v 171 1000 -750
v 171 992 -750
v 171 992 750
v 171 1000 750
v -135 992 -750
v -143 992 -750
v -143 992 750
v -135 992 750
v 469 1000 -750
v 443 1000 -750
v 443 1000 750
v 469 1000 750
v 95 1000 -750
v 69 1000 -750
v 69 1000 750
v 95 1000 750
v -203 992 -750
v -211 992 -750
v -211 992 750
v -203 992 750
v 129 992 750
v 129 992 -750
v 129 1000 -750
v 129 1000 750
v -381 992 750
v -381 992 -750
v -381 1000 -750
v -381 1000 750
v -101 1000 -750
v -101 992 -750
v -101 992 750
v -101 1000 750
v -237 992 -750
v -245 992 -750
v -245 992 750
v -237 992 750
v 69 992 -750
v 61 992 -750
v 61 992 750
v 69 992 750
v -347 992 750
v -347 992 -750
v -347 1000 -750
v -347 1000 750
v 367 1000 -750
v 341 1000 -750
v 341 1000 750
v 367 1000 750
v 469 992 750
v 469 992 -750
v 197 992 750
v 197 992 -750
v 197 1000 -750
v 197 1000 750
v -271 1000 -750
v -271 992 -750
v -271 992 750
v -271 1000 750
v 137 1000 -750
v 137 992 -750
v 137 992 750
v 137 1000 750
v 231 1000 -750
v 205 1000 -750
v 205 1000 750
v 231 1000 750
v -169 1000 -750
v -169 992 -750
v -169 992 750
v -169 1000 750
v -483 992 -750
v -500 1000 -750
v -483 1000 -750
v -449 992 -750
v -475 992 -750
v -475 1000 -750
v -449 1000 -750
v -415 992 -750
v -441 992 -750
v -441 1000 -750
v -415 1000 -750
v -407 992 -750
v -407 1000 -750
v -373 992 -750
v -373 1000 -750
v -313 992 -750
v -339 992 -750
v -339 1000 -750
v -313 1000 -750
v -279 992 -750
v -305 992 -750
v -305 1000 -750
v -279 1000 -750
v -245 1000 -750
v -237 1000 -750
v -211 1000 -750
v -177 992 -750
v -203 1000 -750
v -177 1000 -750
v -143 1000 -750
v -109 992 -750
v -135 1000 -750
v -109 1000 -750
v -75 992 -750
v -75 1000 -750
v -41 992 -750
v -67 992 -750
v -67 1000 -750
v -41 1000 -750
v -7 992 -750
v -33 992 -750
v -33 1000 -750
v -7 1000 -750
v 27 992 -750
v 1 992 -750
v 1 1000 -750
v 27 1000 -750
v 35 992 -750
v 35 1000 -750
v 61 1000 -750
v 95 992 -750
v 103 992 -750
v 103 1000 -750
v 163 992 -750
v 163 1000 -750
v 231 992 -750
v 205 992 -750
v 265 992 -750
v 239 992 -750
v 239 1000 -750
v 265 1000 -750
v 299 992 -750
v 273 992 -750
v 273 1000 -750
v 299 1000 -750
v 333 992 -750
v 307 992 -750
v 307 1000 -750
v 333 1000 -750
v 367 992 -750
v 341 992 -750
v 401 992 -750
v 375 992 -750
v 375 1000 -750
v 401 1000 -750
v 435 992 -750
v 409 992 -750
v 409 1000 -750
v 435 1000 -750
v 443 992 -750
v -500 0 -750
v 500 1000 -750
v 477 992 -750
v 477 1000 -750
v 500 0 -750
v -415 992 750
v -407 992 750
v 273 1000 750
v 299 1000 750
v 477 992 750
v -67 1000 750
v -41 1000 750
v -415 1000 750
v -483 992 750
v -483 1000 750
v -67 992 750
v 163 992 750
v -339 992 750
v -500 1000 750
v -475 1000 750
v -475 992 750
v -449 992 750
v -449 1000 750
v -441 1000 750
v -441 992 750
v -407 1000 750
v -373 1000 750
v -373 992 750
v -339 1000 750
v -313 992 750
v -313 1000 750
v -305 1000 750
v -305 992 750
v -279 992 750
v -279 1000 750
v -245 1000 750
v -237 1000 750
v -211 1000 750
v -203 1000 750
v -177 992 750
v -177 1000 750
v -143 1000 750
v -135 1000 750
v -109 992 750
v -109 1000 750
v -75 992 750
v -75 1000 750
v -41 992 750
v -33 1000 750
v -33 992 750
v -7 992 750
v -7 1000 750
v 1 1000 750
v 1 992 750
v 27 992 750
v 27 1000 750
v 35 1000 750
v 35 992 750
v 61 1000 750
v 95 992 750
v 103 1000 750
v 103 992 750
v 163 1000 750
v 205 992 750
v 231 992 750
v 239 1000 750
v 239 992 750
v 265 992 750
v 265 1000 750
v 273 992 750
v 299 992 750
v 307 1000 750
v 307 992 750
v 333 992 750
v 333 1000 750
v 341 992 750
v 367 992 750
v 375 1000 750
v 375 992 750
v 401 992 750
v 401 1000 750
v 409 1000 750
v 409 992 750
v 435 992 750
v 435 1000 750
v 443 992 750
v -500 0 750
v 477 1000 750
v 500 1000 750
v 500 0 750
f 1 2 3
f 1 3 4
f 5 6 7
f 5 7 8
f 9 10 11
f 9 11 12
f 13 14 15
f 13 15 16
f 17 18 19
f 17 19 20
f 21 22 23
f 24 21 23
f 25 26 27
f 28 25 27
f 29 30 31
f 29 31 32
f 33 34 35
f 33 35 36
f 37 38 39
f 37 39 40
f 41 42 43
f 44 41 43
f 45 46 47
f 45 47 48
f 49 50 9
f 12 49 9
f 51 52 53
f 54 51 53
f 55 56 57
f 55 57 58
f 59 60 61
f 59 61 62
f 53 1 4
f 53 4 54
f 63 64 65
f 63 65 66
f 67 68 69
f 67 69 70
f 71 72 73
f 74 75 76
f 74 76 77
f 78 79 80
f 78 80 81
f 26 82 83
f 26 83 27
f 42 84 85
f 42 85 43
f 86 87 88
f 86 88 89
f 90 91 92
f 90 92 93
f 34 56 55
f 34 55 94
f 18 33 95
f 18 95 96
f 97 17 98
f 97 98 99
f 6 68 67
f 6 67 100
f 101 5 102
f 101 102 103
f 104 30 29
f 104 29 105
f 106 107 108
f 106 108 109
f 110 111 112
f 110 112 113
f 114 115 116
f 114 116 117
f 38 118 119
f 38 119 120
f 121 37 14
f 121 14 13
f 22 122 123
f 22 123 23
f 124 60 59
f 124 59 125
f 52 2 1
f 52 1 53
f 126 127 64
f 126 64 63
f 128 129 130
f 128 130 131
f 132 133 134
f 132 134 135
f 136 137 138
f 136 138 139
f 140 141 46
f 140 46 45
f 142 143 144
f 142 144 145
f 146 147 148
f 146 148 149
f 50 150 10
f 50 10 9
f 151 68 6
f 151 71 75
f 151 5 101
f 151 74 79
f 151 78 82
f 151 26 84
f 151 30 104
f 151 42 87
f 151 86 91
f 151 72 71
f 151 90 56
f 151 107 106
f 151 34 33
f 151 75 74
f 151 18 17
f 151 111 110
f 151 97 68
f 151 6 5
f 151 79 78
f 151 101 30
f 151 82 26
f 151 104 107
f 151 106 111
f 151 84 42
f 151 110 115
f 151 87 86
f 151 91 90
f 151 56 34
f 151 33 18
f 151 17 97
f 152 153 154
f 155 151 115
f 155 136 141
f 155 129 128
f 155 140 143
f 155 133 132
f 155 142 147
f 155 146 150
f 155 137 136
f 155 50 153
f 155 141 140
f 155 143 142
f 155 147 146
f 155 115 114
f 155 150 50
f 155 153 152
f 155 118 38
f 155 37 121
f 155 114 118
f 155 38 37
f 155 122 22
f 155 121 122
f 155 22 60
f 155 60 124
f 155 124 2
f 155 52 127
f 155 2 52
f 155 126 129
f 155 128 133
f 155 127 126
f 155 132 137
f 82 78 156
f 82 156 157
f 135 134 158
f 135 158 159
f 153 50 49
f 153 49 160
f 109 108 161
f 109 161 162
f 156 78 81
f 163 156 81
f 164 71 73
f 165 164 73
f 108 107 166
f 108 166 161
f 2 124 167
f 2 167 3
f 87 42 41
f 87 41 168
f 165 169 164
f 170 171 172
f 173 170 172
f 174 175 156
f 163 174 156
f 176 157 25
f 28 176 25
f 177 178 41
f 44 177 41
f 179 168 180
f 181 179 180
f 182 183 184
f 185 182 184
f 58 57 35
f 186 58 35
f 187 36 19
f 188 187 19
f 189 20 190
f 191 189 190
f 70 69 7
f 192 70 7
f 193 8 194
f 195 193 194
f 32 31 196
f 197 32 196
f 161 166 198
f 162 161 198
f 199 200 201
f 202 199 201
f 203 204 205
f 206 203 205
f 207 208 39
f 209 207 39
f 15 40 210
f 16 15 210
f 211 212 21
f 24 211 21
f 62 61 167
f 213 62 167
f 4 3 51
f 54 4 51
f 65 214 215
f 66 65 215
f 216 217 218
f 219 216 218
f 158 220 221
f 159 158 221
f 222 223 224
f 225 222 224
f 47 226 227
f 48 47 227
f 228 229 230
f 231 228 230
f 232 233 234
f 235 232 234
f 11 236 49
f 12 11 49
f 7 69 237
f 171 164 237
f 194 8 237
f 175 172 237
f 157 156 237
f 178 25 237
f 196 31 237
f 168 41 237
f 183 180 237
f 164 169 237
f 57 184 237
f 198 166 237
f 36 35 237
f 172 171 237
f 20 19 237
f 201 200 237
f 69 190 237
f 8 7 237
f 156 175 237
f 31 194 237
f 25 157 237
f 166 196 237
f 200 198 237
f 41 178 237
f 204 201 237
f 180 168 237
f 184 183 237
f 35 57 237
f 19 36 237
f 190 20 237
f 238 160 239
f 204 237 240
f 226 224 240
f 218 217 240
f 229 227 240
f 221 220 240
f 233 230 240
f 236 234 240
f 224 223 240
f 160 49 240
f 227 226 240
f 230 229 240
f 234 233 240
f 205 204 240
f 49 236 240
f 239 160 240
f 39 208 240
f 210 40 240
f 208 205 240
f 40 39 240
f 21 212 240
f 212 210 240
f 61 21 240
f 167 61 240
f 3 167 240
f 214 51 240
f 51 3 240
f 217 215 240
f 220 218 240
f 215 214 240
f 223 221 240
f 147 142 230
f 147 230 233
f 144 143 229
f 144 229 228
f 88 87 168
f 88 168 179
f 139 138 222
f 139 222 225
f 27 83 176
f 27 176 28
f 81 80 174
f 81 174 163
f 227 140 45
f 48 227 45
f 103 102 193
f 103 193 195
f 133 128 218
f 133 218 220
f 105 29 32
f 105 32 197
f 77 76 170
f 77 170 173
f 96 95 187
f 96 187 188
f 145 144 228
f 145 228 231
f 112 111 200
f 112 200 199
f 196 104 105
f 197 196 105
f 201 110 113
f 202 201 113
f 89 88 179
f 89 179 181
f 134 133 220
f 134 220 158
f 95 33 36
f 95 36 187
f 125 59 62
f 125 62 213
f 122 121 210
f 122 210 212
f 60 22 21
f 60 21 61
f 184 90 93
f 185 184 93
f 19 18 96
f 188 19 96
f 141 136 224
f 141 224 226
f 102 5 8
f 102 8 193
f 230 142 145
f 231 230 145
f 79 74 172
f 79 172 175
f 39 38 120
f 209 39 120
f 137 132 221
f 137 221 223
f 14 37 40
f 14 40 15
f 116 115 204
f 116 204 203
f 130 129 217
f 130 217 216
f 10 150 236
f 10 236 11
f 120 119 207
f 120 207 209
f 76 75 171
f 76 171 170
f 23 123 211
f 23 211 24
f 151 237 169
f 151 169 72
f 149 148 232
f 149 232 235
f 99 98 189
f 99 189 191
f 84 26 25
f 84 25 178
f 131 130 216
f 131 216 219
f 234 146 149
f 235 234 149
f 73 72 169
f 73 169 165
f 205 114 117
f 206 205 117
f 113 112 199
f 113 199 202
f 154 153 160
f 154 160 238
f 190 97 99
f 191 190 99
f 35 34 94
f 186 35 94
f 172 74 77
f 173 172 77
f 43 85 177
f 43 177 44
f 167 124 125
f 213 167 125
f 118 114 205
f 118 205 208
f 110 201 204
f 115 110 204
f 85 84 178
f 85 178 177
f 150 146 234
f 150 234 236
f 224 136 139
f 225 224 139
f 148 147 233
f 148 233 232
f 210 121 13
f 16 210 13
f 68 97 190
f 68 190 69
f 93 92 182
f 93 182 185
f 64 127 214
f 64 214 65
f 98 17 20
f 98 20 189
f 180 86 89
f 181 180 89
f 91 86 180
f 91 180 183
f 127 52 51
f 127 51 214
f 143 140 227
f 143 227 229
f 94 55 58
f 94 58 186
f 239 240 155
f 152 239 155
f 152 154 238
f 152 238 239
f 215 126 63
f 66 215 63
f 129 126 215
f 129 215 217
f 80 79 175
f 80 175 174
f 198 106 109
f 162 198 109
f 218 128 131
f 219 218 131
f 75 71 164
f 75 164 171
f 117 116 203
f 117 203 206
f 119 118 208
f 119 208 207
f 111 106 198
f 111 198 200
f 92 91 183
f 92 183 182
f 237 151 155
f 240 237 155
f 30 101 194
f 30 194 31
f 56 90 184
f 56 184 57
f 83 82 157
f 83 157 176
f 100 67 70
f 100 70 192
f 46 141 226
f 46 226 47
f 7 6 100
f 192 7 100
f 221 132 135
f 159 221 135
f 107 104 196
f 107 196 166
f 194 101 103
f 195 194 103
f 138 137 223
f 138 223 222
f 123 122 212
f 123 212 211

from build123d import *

# Parameters (mm, degrees)
SKETCH_2_W          = 1000
SKETCH_2_H          = 1500
EXTRUDE_1_DEPTH     = 1000
SKETCH_4_W          = 8
SKETCH_4_H          = 8
CUT_EXTRUDE_1_DEPTH = 1500


with BuildPart() as part:
    # 草图2 → 凸台-拉伸1 (new body)
    with BuildSketch(Plane(origin=(0, 0, 0), x_dir=(1, 0, 0), z_dir=(0, 1, 0))):
        Rectangle(SKETCH_2_W, SKETCH_2_H)
    extrude(amount=EXTRUDE_1_DEPTH)

    # 草图4 → 切除-拉伸1 (cut)
    with BuildSketch(Plane.XY.offset(750)):
        with Locations((-479, 996)):
            Rectangle(SKETCH_4_W, SKETCH_4_H)
        with Locations((-445, 996)):
            Rectangle(SKETCH_4_W, SKETCH_4_H)
        with Locations((-411, 996)):
            Rectangle(SKETCH_4_W, SKETCH_4_H)
        with Locations((-377, 996)):
            Rectangle(SKETCH_4_W, SKETCH_4_H)
        with Locations((-343, 996)):
            Rectangle(SKETCH_4_W, SKETCH_4_H)
        with Locations((-309, 996)):
            Rectangle(SKETCH_4_W, SKETCH_4_H)
        with Locations((-275, 996)):
            Rectangle(SKETCH_4_W, SKETCH_4_H)
        with Locations((-241, 996)):
            Rectangle(SKETCH_4_W, SKETCH_4_H)
        with Locations((-207, 996)):
            Rectangle(SKETCH_4_W, SKETCH_4_H)
        with Locations((-173, 996)):
            Rectangle(SKETCH_4_W, SKETCH_4_H)
        with Locations((-139, 996)):
            Rectangle(SKETCH_4_W, SKETCH_4_H)
        with Locations((-105, 996)):
            Rectangle(SKETCH_4_W, SKETCH_4_H)
        with Locations((-71, 996)):
            Rectangle(SKETCH_4_W, SKETCH_4_H)
        with Locations((-37, 996)):
            Rectangle(SKETCH_4_W, SKETCH_4_H)
        with Locations((-3, 996)):
            Rectangle(SKETCH_4_W, SKETCH_4_H)
        with Locations((31, 996)):
            Rectangle(SKETCH_4_W, SKETCH_4_H)
        with Locations((65, 996)):
            Rectangle(SKETCH_4_W, SKETCH_4_H)
        with Locations((99, 996)):
            Rectangle(SKETCH_4_W, SKETCH_4_H)
        with Locations((133, 996)):
            Rectangle(SKETCH_4_W, SKETCH_4_H)
        with Locations((167, 996)):
            Rectangle(SKETCH_4_W, SKETCH_4_H)
        with Locations((201, 996)):
            Rectangle(SKETCH_4_W, SKETCH_4_H)
        with Locations((235, 996)):
            Rectangle(SKETCH_4_W, SKETCH_4_H)
        with Locations((269, 996)):
            Rectangle(SKETCH_4_W, SKETCH_4_H)
        with Locations((303, 996)):
            Rectangle(SKETCH_4_W, SKETCH_4_H)
        with Locations((337, 996)):
            Rectangle(SKETCH_4_W, SKETCH_4_H)
        with Locations((371, 996)):
            Rectangle(SKETCH_4_W, SKETCH_4_H)
        with Locations((405, 996)):
            Rectangle(SKETCH_4_W, SKETCH_4_H)
        with Locations((439, 996)):
            Rectangle(SKETCH_4_W, SKETCH_4_H)
        with Locations((473, 996)):
            Rectangle(SKETCH_4_W, SKETCH_4_H)
    extrude(amount=-CUT_EXTRUDE_1_DEPTH, mode=Mode.SUBTRACT)


solid = part.part
